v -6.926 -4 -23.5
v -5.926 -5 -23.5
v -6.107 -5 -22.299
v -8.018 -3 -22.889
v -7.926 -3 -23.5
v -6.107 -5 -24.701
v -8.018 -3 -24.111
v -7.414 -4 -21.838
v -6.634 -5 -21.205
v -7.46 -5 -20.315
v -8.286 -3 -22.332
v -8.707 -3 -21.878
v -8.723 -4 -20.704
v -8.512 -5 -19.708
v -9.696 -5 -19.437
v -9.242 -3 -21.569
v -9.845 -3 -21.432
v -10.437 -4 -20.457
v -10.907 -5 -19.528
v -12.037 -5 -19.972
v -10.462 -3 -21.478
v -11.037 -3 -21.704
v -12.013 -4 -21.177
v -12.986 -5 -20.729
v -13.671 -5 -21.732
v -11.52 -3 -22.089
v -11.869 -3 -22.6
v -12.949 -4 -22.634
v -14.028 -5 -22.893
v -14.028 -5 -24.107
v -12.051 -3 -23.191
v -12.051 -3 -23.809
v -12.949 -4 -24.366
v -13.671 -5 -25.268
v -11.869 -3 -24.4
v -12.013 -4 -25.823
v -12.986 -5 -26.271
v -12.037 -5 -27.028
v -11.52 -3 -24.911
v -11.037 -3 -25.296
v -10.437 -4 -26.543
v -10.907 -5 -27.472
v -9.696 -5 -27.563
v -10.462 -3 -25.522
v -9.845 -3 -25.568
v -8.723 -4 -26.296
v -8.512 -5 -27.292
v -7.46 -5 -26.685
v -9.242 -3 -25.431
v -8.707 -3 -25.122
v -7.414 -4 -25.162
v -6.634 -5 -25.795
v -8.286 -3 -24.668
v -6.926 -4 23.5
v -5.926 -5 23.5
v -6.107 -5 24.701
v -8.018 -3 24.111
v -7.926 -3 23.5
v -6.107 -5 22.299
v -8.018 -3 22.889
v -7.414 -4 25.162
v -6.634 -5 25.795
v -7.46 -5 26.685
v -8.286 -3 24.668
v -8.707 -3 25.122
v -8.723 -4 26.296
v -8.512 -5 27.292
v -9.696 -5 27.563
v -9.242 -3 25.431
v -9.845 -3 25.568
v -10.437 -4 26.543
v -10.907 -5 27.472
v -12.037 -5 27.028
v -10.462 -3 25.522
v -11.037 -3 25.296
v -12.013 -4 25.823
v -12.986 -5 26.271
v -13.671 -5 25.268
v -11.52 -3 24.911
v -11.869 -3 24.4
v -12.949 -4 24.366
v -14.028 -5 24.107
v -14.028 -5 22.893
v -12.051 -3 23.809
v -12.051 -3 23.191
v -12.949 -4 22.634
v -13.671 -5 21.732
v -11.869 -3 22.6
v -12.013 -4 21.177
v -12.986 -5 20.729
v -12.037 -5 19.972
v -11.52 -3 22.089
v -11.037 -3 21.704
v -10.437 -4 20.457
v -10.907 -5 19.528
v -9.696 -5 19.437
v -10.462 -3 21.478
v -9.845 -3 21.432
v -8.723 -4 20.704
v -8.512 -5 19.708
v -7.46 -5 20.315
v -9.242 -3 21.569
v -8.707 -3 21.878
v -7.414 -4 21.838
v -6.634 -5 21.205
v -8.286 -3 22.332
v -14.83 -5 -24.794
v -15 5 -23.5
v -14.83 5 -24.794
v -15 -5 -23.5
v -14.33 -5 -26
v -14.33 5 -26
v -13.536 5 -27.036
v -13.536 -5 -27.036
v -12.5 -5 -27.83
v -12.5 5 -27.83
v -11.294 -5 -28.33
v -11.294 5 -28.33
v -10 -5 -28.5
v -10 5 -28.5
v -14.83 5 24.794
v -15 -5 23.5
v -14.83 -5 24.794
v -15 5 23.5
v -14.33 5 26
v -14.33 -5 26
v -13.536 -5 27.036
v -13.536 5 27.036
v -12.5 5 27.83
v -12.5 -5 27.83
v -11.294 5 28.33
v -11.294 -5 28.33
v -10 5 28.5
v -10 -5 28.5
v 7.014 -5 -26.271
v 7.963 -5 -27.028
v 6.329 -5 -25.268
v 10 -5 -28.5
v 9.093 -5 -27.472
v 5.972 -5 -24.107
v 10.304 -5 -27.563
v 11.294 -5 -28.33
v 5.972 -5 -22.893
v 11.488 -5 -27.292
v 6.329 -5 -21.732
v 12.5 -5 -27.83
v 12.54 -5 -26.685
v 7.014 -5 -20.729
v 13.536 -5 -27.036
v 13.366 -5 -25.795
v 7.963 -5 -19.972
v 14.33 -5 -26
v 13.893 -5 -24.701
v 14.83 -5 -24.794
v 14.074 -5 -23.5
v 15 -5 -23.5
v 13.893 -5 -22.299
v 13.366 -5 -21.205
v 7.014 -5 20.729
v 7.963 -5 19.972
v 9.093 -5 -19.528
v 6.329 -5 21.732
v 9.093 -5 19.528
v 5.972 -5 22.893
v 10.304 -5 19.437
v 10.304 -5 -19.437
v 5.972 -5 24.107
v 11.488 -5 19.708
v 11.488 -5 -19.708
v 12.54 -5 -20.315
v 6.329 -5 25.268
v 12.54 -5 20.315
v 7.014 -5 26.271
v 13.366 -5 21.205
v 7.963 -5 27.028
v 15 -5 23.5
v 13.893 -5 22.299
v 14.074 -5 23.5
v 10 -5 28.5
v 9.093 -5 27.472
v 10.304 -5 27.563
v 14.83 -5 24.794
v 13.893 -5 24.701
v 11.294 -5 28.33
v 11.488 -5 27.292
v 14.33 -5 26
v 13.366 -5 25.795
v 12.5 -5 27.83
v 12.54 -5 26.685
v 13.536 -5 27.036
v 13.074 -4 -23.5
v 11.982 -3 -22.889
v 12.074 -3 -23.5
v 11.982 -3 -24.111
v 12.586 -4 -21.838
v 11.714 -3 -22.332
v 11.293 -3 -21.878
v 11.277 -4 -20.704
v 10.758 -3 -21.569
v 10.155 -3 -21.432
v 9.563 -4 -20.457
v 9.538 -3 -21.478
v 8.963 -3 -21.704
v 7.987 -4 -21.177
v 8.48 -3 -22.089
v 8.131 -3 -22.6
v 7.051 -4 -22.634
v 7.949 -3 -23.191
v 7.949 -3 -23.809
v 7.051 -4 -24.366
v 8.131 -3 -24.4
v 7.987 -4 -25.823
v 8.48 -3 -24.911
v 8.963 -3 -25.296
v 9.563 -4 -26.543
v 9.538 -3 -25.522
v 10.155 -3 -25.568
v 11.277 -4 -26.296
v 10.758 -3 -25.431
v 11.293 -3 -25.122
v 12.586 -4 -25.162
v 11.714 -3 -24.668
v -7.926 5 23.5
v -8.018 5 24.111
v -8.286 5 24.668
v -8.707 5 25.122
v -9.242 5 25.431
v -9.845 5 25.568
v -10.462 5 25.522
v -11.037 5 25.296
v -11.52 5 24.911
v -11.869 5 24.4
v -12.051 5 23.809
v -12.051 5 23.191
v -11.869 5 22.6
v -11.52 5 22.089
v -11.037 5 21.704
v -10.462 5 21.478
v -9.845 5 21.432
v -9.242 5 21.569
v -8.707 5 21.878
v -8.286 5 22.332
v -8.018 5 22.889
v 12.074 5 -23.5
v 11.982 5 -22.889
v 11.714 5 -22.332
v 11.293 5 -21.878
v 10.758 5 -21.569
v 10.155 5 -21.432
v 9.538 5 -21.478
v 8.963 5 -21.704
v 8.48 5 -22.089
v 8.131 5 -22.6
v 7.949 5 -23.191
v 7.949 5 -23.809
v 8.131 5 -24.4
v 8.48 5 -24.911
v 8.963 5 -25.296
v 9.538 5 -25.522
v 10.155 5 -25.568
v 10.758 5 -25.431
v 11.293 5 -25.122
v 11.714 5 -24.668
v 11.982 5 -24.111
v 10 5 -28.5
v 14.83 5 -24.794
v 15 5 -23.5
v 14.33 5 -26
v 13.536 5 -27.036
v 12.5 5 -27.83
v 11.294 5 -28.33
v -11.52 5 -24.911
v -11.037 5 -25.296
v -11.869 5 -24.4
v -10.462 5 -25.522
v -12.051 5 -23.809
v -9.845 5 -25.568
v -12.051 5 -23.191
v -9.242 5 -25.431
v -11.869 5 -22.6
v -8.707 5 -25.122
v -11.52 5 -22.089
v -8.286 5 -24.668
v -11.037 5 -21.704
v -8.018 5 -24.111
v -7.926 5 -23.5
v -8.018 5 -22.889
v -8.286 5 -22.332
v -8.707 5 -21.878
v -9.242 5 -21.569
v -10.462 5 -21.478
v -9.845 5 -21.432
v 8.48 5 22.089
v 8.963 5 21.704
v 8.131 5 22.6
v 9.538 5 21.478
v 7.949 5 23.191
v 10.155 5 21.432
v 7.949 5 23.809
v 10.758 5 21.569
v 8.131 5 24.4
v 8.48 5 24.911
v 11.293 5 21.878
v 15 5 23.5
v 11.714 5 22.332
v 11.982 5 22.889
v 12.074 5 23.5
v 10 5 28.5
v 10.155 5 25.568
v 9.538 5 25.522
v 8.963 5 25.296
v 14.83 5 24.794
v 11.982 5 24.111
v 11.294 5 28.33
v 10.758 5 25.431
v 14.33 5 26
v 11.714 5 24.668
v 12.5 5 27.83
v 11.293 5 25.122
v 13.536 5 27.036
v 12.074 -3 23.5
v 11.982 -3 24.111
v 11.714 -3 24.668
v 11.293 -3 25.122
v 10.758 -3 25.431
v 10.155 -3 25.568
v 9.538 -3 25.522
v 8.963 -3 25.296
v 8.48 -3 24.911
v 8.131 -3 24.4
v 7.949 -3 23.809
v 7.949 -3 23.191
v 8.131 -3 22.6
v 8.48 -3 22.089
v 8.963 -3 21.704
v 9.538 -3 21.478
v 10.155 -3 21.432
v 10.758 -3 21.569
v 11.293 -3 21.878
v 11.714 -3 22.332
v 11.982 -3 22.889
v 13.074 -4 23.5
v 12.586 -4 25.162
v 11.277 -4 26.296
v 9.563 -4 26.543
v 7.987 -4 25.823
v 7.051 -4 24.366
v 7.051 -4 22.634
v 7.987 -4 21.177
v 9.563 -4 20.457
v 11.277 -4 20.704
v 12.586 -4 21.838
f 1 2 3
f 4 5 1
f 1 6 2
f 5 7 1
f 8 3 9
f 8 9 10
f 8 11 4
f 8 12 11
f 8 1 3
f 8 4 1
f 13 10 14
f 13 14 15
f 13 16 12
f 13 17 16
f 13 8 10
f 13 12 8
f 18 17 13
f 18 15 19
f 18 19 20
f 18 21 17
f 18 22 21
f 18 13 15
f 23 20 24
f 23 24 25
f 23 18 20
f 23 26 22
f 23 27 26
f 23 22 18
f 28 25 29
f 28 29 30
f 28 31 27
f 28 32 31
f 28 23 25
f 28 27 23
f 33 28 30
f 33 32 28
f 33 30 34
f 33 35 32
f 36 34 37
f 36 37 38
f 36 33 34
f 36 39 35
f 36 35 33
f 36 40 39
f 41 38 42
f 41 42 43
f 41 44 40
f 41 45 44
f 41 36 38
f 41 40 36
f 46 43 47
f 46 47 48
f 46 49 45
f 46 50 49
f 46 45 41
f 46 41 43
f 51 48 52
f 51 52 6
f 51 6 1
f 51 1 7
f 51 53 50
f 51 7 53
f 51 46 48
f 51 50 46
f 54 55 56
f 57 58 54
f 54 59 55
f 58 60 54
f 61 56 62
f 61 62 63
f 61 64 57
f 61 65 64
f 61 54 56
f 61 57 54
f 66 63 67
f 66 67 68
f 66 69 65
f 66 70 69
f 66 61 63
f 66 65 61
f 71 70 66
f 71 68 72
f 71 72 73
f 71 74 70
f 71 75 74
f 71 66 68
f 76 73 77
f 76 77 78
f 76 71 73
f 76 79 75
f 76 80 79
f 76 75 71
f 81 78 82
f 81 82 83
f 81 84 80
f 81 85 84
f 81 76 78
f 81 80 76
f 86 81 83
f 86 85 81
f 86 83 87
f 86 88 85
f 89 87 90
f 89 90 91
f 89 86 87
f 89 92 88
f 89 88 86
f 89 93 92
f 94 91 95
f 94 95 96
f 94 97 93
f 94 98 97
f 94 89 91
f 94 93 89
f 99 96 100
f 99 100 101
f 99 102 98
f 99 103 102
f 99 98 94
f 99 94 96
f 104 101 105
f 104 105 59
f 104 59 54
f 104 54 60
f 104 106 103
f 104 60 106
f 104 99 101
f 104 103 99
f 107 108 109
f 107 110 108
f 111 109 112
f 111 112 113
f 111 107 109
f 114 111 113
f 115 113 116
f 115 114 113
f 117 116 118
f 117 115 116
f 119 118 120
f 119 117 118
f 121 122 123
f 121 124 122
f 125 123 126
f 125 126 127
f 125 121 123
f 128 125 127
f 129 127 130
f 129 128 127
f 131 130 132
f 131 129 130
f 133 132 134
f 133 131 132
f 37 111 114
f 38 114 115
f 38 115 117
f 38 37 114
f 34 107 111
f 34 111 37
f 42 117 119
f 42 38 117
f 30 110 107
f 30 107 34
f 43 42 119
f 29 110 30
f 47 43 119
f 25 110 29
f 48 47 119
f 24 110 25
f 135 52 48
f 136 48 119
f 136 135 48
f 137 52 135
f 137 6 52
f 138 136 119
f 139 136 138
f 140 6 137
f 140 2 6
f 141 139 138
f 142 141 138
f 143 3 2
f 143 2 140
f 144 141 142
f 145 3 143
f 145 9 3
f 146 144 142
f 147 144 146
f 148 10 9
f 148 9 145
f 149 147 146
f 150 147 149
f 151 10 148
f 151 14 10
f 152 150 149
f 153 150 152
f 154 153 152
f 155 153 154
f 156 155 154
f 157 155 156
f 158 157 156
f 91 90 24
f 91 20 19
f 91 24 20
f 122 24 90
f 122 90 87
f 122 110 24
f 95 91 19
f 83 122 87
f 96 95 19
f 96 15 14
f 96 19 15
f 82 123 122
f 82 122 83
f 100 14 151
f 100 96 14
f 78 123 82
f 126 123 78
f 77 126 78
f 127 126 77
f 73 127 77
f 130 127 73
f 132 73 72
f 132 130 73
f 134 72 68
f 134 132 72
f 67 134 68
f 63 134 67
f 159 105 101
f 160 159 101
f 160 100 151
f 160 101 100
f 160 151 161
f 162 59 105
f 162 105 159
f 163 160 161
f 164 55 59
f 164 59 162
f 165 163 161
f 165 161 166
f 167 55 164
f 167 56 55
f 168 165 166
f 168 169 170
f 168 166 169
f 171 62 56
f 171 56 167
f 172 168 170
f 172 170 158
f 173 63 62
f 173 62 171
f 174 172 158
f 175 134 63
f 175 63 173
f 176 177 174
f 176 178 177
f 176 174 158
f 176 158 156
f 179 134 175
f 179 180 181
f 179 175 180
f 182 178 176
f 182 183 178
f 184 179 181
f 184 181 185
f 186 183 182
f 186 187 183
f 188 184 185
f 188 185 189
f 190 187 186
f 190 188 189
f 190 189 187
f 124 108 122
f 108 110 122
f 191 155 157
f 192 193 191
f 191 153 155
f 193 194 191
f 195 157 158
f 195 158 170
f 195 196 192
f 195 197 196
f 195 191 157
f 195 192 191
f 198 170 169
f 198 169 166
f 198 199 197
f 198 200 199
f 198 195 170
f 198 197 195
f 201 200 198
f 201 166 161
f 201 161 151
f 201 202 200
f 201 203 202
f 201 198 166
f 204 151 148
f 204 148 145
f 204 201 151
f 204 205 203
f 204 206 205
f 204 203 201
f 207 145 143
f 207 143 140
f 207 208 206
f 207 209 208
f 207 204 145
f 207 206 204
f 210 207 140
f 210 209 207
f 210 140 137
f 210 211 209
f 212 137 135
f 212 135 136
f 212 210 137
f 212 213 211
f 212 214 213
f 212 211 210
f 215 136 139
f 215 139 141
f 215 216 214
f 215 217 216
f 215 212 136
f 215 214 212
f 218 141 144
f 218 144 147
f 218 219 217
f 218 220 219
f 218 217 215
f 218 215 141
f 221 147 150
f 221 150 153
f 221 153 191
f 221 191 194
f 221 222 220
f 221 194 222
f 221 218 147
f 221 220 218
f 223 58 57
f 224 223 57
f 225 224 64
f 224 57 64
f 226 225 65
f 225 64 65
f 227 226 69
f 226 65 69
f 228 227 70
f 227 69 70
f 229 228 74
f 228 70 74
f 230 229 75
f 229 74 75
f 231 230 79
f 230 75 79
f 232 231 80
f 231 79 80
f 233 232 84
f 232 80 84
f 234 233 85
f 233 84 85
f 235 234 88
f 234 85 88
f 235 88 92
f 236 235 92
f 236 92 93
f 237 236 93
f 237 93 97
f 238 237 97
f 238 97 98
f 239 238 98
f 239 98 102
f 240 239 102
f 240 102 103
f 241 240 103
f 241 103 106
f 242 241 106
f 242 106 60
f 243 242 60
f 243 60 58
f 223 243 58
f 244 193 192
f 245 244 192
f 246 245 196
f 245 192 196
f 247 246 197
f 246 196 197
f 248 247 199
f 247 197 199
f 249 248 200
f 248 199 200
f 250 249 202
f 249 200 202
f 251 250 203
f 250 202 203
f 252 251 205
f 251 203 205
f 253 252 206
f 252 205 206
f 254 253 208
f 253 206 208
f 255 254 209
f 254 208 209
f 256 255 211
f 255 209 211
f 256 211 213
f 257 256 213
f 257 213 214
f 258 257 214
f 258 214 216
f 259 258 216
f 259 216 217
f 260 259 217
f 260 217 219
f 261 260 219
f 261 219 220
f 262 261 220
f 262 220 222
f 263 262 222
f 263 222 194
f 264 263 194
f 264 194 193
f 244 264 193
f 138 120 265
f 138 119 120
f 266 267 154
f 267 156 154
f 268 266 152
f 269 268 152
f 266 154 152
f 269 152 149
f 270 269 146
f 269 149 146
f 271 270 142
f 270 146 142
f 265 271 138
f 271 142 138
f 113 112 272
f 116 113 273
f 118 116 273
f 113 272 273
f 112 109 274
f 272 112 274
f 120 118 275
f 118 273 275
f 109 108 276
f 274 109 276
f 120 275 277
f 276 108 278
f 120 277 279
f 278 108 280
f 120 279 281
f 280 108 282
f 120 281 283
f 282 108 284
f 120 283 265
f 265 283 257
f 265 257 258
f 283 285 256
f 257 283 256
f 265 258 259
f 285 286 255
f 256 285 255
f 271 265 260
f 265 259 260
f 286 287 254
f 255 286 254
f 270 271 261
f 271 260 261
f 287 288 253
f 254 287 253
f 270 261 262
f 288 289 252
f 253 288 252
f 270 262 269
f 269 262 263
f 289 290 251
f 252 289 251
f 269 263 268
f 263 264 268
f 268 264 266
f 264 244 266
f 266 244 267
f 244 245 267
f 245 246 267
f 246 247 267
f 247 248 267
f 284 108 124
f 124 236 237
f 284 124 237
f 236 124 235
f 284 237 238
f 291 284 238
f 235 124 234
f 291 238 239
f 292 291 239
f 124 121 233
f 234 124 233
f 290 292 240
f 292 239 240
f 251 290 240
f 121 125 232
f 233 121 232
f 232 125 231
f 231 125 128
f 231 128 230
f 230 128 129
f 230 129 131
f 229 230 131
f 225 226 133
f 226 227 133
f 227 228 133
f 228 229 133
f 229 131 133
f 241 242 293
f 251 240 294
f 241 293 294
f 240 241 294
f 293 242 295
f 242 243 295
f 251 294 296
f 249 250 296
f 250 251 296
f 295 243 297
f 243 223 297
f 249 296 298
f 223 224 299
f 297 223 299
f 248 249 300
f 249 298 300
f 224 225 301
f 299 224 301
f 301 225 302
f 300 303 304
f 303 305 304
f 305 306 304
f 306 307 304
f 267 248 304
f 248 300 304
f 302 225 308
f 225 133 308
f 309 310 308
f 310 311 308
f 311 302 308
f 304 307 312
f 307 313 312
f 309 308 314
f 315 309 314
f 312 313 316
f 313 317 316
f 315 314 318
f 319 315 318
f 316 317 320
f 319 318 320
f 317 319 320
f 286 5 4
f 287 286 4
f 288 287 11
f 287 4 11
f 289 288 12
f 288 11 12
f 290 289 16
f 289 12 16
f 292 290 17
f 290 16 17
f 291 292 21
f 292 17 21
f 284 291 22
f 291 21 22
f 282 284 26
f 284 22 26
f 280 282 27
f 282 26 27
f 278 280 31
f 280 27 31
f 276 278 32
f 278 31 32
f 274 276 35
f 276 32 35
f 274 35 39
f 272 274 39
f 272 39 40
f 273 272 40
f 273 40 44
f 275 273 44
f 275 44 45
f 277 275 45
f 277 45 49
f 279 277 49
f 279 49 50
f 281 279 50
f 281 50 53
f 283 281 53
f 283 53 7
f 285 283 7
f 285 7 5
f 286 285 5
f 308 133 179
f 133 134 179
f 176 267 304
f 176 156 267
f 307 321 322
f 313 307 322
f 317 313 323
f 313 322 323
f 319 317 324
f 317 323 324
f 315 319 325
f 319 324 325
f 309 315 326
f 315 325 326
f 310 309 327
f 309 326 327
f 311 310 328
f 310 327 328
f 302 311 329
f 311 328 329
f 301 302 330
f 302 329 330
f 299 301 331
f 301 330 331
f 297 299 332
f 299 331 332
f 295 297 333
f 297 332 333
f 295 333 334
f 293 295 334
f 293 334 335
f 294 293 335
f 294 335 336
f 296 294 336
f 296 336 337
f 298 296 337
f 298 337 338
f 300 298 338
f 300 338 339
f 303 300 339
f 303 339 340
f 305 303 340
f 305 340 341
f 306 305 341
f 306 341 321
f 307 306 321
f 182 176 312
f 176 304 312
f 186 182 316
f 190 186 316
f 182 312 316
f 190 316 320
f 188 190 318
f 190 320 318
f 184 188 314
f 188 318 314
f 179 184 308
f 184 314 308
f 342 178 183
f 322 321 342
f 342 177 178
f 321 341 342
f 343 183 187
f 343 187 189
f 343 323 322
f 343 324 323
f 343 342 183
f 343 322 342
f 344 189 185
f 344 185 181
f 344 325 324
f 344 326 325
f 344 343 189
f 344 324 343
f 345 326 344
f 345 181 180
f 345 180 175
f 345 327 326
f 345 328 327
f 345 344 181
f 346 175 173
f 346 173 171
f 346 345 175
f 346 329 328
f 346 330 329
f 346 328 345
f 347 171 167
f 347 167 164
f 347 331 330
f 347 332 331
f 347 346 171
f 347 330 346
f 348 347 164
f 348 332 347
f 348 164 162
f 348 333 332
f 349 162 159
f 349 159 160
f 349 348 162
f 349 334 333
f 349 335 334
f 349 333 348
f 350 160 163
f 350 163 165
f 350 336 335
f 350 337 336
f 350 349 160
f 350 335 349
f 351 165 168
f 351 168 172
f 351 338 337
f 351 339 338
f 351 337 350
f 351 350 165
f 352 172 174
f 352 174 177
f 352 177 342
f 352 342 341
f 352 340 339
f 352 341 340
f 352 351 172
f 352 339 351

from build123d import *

# Parameters (mm, degrees)
F0_W          = 30
F0_H          = 57
F1_DEPTH      = 5
F1_DEPTH_BACK = 5
F2_R          = 5
F3_R          = 2.074
F4_DEPTH      = 10.001
F5_SIZE       = 2


with BuildPart() as f1:
    # F0 (on Front) → F1 (new body, two sides)
    with BuildSketch(Plane.XZ) as f1_sk:
        Rectangle(F0_W, F0_H)
    extrude(amount=F1_DEPTH)
    extrude(f1_sk.sketch, amount=-F1_DEPTH_BACK)

    # F2
    f2_edges = [f1.edges().sort_by_distance(p)[0] for p in [
        (-15, 0, 28.5),
        (15, 0, 28.5),
        (-15, 0, -28.5),
        (15, 0, -28.5),
    ]]
    fillet(f2_edges, radius=F2_R)

    # F3 (on face) → F4 (cut, through all)
    with BuildSketch(Plane.XZ.offset(5)):
        with Locations((-10, 23.5)):
            Circle(F3_R)
        with Locations((10, 23.5)):
            Circle(F3_R)
        with Locations((-10, -23.5)):
            Circle(F3_R)
        with Locations((10, -23.5)):
            Circle(F3_R)
    extrude(amount=-F4_DEPTH, mode=Mode.SUBTRACT)

    # F5
    f5_edges = [f1.edges().sort_by_distance(p)[0] for p in [
        (-12.074, -5, 23.5),
        (7.926, -5, 23.5),
        (-12.074, -5, -23.5),
        (7.926, -5, -23.5),
    ]]
    chamfer(f5_edges, length=F5_SIZE)


solid = f1.part
